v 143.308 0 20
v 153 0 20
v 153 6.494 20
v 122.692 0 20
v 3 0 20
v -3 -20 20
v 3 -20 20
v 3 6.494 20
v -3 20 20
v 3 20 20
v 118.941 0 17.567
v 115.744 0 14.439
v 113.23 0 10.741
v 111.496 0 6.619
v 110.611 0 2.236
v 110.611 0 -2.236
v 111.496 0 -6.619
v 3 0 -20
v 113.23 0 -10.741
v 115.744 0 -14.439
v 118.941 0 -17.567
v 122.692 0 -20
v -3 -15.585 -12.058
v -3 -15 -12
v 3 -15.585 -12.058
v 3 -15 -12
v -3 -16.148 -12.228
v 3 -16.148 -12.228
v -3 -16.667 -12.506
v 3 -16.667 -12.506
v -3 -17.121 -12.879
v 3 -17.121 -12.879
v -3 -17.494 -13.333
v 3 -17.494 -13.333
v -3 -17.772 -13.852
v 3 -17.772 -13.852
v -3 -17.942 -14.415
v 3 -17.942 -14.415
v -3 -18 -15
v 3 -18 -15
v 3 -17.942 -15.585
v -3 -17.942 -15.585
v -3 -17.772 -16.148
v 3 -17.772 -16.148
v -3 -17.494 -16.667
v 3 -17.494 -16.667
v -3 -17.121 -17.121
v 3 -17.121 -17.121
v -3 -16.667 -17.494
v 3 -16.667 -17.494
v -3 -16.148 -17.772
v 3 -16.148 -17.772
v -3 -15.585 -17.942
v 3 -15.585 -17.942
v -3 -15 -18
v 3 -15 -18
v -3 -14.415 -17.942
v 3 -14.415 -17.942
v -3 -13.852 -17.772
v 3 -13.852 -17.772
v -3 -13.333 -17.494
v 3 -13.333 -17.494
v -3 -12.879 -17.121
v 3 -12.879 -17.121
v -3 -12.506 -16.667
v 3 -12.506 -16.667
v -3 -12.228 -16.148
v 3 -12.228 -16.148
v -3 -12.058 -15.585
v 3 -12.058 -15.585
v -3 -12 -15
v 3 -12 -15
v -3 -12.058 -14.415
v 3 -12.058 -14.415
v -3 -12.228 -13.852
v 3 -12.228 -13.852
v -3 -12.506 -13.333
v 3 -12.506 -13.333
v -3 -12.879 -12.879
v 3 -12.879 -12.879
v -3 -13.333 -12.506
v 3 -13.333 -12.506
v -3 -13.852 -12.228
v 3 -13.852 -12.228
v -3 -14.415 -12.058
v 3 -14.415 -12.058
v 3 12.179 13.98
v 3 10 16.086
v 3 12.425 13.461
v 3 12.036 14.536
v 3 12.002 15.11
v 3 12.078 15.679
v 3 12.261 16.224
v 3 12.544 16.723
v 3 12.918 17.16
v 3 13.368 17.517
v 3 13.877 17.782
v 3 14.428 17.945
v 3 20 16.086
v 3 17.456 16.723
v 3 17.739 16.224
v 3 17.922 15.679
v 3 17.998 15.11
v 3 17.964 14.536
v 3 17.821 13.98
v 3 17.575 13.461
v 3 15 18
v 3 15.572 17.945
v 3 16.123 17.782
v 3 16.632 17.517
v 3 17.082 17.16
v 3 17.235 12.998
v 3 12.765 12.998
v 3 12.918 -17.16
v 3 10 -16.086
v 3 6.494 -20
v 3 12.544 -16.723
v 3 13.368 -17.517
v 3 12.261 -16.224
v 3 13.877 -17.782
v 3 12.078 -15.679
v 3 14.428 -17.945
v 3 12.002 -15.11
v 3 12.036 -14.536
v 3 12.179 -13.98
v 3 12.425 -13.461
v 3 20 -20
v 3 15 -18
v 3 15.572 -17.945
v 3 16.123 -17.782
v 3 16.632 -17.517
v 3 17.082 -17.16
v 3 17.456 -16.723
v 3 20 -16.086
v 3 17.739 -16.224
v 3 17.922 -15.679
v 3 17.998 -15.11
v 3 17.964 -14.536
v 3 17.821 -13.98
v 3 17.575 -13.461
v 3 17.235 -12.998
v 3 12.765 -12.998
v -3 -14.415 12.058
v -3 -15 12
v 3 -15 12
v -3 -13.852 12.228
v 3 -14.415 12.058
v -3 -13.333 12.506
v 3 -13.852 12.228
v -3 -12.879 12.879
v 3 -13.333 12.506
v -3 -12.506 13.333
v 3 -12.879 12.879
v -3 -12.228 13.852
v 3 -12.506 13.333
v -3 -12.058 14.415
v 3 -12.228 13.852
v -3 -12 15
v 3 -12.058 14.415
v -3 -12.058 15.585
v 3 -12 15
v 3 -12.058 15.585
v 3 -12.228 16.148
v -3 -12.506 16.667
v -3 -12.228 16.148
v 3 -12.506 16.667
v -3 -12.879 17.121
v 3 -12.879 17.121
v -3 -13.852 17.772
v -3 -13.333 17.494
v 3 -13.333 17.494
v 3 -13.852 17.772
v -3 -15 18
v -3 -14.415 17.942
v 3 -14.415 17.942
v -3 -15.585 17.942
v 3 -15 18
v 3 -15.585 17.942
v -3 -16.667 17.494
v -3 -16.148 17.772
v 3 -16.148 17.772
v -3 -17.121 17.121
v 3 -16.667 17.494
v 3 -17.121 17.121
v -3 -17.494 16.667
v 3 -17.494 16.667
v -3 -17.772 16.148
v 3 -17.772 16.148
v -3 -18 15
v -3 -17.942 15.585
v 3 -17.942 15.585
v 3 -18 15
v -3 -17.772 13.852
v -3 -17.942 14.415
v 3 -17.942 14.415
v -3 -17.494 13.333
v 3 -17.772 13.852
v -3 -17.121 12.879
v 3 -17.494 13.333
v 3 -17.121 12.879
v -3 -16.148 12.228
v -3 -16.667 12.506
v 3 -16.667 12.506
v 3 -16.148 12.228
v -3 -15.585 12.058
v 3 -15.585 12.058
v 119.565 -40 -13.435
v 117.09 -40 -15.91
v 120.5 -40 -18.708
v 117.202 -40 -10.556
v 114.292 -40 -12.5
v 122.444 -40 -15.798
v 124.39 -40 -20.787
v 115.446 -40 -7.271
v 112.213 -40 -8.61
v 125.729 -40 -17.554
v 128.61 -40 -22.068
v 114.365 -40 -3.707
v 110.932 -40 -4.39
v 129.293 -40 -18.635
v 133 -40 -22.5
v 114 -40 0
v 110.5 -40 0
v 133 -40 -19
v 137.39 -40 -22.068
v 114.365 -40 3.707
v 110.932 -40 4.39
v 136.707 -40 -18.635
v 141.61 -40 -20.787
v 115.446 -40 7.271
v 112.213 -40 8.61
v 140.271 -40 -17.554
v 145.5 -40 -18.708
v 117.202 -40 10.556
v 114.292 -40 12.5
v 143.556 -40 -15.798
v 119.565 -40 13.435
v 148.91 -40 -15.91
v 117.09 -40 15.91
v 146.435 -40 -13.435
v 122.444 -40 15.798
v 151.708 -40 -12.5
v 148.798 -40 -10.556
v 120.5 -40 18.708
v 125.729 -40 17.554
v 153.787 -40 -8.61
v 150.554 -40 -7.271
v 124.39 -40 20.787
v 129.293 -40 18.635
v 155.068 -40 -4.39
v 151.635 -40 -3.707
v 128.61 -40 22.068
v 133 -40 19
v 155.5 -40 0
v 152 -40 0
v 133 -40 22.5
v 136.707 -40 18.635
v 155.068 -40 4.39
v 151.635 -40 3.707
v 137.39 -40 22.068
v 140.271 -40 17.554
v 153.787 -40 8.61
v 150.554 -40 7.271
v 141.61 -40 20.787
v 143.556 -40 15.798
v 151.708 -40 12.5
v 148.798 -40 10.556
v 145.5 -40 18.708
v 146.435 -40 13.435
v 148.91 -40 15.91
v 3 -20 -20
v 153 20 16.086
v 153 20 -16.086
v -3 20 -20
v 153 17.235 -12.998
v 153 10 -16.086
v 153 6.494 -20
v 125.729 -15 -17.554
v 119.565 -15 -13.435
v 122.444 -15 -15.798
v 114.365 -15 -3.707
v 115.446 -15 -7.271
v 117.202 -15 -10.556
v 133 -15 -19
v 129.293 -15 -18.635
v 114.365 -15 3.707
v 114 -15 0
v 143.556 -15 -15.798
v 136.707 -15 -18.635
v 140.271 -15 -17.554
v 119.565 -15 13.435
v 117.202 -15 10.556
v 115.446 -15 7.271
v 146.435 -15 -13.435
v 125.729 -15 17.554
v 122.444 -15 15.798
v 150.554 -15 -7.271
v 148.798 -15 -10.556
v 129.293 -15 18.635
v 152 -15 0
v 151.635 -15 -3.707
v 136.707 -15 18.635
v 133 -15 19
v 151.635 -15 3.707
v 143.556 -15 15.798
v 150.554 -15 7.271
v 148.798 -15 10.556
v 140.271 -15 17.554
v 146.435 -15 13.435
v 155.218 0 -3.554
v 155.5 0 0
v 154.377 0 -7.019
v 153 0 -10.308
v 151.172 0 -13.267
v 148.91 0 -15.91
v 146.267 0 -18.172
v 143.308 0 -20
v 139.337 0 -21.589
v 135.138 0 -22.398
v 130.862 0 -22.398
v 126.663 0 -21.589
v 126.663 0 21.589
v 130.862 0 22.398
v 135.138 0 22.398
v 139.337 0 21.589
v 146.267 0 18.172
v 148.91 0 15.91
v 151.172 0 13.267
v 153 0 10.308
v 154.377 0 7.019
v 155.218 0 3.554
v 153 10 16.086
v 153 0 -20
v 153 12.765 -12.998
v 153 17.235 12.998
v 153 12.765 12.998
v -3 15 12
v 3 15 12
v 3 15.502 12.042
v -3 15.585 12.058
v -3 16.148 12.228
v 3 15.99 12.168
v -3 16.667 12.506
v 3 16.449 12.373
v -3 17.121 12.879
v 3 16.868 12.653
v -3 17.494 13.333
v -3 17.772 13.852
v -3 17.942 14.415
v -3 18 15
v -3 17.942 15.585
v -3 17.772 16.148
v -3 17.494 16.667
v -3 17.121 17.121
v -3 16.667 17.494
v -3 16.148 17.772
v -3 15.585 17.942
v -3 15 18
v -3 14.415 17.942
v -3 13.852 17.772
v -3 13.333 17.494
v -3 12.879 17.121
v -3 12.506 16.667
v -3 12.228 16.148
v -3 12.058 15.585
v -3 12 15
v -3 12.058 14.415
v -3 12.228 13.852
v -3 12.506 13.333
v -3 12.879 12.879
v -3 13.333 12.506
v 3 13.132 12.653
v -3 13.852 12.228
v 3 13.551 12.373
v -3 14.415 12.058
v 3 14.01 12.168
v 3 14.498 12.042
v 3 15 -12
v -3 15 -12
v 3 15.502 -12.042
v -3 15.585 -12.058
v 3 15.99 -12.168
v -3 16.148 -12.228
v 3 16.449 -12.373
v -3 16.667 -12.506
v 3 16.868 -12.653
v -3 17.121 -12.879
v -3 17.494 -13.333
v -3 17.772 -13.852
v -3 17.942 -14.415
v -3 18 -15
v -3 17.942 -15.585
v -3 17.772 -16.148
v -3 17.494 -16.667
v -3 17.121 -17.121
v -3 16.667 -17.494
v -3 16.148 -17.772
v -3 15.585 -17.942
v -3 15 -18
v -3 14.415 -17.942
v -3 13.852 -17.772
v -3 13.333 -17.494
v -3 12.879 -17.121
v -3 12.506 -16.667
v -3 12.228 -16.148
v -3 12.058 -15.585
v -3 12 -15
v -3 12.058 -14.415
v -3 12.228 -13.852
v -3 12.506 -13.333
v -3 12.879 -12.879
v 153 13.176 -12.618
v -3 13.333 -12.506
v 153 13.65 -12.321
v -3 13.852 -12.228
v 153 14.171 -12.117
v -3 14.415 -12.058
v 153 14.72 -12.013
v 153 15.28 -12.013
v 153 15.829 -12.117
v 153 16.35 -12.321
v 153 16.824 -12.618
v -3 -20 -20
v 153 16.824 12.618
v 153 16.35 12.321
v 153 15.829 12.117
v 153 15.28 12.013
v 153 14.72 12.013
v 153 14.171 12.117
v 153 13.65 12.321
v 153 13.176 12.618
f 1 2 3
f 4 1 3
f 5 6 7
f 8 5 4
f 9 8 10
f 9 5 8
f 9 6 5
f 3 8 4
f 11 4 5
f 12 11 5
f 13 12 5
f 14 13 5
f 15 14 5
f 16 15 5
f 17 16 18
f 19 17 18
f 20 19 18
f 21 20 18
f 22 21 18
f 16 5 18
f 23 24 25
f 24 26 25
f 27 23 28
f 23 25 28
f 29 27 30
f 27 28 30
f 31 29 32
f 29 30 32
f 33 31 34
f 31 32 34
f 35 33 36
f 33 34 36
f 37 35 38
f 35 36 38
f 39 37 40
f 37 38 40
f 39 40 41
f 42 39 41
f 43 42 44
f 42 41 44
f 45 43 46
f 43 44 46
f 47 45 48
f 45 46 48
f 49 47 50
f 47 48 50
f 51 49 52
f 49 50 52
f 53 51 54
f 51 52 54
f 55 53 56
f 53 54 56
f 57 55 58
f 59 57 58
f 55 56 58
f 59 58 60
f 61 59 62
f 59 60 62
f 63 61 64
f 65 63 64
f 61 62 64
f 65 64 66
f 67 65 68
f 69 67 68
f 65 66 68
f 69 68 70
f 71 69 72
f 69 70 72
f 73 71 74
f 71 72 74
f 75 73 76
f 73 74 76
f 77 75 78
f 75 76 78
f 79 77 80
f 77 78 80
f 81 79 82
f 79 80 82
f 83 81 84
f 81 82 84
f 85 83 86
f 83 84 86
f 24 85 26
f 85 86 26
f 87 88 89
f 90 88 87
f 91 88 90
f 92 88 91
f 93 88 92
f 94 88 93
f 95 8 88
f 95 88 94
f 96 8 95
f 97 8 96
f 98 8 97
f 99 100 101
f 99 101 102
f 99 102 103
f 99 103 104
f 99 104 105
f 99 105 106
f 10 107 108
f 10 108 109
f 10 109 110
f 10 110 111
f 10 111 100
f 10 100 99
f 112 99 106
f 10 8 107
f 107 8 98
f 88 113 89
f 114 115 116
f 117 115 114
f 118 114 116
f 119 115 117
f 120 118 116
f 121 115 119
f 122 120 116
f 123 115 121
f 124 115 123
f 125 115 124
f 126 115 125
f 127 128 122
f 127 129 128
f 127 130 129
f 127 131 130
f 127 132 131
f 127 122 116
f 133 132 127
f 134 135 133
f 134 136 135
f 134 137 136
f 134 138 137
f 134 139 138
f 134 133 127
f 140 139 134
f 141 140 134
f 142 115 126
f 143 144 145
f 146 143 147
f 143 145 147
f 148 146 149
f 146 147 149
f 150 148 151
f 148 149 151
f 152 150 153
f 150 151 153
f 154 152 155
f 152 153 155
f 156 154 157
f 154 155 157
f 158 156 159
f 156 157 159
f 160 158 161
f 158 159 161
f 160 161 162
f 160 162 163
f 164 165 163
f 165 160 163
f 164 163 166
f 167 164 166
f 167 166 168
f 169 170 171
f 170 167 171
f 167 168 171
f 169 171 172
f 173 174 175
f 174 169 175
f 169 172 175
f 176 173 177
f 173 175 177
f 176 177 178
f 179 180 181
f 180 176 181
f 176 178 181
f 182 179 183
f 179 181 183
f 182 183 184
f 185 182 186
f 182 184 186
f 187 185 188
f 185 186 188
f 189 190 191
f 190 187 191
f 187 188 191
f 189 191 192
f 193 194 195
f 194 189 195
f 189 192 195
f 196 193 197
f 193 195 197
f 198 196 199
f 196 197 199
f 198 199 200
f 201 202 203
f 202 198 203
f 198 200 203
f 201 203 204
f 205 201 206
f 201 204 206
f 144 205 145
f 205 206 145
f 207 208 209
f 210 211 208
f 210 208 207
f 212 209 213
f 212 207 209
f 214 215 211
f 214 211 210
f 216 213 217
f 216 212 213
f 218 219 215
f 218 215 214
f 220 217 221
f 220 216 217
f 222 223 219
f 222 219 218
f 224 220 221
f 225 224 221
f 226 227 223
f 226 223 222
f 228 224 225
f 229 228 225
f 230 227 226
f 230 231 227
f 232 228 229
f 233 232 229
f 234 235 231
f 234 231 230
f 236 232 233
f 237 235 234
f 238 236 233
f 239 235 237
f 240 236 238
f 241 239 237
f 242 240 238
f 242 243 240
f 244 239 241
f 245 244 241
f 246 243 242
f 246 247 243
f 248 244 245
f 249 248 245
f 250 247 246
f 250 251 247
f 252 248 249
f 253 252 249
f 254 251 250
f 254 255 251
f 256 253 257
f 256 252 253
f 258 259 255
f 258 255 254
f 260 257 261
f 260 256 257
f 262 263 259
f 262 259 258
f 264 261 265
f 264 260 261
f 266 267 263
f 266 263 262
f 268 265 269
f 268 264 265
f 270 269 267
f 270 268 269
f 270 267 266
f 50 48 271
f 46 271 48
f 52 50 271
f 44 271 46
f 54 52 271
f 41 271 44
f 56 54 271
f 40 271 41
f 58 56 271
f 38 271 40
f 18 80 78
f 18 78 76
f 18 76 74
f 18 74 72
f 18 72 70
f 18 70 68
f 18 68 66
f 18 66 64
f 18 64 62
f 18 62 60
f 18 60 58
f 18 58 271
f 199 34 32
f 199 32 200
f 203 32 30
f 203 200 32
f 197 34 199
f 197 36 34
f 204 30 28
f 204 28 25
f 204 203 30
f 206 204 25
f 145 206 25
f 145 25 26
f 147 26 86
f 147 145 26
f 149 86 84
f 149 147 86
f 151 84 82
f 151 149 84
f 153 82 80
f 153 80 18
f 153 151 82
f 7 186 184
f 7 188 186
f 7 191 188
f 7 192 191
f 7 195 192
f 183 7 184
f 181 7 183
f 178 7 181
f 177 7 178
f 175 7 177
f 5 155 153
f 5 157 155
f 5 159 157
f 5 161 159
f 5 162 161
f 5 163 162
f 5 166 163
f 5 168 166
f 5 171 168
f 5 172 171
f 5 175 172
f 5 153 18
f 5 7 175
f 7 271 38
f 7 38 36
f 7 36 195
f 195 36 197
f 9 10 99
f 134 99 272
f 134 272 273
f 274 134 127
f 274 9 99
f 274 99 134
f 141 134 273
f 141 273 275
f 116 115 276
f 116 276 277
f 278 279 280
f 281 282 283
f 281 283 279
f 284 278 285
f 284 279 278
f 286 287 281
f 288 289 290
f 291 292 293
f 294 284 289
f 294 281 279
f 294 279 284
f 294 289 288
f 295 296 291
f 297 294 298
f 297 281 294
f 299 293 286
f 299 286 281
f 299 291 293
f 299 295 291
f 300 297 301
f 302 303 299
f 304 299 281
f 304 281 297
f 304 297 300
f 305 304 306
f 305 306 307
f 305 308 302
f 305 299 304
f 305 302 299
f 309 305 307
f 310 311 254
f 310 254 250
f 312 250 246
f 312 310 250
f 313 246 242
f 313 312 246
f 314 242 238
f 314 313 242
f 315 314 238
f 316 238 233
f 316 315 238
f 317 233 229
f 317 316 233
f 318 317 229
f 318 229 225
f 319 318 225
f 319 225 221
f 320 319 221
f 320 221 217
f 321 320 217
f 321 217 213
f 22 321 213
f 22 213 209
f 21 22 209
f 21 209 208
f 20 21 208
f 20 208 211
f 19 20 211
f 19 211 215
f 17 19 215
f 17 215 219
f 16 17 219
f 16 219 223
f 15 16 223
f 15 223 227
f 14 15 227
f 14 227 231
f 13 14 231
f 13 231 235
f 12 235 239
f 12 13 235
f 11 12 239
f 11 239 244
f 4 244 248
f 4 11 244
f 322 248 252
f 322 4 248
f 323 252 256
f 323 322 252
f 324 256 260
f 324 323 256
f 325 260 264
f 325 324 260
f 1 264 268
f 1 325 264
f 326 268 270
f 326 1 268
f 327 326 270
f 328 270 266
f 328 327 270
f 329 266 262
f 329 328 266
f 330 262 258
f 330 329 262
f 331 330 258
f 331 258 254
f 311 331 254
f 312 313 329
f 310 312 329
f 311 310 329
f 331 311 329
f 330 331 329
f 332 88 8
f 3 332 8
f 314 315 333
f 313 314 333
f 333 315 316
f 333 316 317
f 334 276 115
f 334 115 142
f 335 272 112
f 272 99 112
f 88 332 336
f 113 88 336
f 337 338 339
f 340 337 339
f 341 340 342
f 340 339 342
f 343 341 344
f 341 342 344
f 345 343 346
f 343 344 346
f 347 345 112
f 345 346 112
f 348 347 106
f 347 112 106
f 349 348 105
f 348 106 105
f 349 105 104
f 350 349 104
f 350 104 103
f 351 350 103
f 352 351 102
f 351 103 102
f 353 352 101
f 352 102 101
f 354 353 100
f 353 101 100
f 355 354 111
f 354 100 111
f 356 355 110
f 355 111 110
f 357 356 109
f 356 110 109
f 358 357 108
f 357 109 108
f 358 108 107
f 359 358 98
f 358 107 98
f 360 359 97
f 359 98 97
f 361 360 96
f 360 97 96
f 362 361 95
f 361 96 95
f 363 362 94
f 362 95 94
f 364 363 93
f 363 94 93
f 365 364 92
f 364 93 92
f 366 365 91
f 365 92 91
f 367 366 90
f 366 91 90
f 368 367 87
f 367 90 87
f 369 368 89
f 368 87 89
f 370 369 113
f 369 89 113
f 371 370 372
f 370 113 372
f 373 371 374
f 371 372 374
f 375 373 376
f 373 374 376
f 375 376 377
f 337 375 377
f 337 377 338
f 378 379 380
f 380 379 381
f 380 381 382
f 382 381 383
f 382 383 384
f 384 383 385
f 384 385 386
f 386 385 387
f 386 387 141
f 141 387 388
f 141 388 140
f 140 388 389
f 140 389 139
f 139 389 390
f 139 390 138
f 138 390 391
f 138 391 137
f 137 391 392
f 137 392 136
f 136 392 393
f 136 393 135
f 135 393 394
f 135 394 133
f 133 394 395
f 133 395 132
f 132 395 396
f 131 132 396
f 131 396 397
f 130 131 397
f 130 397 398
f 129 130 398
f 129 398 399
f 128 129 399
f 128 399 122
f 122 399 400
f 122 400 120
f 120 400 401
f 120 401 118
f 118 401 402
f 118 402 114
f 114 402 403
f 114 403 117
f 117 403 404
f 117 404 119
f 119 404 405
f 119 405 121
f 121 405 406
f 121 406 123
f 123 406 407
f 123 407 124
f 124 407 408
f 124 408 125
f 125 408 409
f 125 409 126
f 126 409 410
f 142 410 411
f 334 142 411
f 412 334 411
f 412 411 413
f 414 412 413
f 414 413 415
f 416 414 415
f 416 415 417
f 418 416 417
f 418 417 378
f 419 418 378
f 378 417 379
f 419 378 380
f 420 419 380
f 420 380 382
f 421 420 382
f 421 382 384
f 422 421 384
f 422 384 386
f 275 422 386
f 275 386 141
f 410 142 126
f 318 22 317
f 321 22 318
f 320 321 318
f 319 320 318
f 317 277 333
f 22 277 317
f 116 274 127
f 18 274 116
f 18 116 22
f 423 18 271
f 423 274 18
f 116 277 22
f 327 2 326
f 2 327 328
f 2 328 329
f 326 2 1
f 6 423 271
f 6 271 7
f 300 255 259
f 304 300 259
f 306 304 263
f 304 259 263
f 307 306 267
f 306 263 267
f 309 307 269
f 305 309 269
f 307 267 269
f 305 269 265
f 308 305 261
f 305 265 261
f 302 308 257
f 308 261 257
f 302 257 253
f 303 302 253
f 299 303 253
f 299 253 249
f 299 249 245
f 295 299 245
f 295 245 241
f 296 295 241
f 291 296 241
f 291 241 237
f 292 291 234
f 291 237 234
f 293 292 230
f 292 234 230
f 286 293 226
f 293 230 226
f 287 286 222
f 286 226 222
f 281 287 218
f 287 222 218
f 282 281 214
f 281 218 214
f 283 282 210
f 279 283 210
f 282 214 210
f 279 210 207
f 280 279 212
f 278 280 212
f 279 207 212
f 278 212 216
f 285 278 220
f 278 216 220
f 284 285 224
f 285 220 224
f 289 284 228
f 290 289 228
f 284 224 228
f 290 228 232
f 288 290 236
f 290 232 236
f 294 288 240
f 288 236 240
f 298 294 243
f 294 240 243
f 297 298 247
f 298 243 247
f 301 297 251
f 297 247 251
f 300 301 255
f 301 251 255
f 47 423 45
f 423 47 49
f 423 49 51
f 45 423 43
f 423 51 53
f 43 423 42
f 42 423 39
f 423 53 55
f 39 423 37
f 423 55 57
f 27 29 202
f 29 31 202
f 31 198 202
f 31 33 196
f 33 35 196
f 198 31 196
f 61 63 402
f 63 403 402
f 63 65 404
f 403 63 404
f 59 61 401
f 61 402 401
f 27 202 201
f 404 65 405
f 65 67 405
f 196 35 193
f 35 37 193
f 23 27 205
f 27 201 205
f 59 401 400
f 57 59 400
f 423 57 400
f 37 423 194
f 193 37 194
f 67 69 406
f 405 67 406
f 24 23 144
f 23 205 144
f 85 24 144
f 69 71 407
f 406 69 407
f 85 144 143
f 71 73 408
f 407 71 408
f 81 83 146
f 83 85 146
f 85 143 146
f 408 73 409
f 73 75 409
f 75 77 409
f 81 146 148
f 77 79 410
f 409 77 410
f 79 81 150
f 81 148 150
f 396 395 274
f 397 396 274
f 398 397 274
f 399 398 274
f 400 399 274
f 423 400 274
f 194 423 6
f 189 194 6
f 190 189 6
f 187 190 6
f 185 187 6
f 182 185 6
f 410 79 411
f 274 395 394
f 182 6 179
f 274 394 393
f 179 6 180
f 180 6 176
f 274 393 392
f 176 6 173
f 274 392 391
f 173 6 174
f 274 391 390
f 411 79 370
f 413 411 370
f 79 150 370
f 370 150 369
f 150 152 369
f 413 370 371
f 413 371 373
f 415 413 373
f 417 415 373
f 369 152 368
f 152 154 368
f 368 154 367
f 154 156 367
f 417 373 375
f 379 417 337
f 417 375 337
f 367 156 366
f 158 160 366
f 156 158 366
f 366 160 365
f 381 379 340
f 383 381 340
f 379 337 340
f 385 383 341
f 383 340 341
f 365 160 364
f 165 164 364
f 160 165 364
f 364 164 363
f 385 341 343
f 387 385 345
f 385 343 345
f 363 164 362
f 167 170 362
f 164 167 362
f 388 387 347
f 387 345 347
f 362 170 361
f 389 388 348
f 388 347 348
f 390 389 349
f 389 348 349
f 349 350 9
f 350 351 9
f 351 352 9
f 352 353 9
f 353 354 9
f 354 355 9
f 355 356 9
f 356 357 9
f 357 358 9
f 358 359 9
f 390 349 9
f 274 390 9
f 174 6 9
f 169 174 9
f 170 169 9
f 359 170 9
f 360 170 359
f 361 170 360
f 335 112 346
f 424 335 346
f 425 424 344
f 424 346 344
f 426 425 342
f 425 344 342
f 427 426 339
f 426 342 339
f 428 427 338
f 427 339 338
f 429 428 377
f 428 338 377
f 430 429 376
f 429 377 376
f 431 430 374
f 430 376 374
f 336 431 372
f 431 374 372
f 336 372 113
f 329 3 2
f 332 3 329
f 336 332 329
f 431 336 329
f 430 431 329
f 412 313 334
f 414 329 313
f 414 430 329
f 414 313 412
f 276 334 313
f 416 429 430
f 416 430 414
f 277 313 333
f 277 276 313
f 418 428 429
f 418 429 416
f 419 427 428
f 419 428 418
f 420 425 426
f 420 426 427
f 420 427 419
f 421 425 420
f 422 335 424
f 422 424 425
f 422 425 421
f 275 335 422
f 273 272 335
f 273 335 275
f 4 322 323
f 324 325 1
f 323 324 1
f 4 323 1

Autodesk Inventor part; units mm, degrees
ref_plane "YZ Plane" through (0, 0, 0) normal (1, 0, 0) x (0, 1, 0)
ref_plane "XZ Plane" through (0, 0, 0) normal (0, 1, 0) x (-1, 0, 0)
sketch "Sketch1" plane through (0, 0, 0) normal (1, 0, 0) x (0, 1, 0)
  line L0 (-20, 20) -> (20, 20)
  line L1 (20, 20) -> (20, -20)
  line L2 (20, -20) -> (-20, -20)
  line L3 (-20, -20) -> (-20, 20)
  line L4 (-20, 20) -> (20, -20) construction
  line L5 (20, 20) -> (-20, -20) construction
  point P0 (0, 0)
  dimension "d0" = 40
  dimension "d1" = 40
extrude "Extrusion1" add sketch "Sketch1" along normal mid plane 6
sketch "Sketch2" plane through (3, 0, 0) normal (1, 0, 0) x (0, 0, -1)
  line L0 (20, 20) -> (-20, 20) projected
  line L1 (-20, 20) -> (-15, 20)
  line L2 (-15, 20) -> (-15, 15)
  line L3 (-15, 15) -> (-20, 15)
  line L4 (-20, 20) -> (-20, -20) projected
  circle A0 centre (-15, 15) radius 3
  point P0 (0, 0)
  dimension "d4" = 5
  dimension "d5" = 5
  dimension "d6" = 6
extrude "Extrusion2" cut sketch "Sketch2" against normal blind 6 contours A0 L3 L2 | L2 L3 A0
mirror "Mirror1" about plane through (0, 0, 0) normal (0, 0, 1) of "Extrusion2"
mirror "Mirror2" about plane through (0, 0, 0) normal (0, 1, 0) of "Extrusion2", "Mirror1"
ref_plane "Work Plane4" through (0, 0, 20) normal (0, 0, -1) x (1, 0, 0)
ref_plane "Work Plane3" through (0, 0, 0) normal (0, 0, -1) x (1, 0, 0)
sketch "Sketch3" plane through (0, 0, 20) normal (0, 0, -1) x (1, 0, 0)
  line L0 (3, -20) -> (3, 20) projected
  line L1 (3, 0) -> (3, -15)
  line L2 (3, -15) -> (153, -15) construction
  line L3 (3, 0) -> (3, -7.5)
  point P0 (0, 0)
  dimension "d10" = 15
  dimension "d11" = 150
  dimension "d12" = 7.5
sketch "Sketch4" plane through (3, 0, 0) normal (1, 0, 0) x (0, 0, -1)
  circle A0 centre (-15, 15) radius 3 projected
  circle A1 centre (15, 15) radius 3 projected
  circle A2 centre (-15, 15) radius 3 projected
  circle A3 centre (-15, 15) radius 3
  circle A4 centre (15, 15) radius 3
  line L0 (-20, 20) -> (20, 20) projected
  line L1 (-16.0857, 20) -> (-12.9984, 17.2346)
  line L2 (-17.7822, 15) -> (18, 15)
  circle A5 centre (15, 15) radius 3 projected
  line L3 (-16.0857, 10) -> (-12.9984, 12.7654)
  line L4 (0, 20) -> (0, 0)
  line L5 (-16.0857, 10) -> (-20, 6.4938)
  line L6 (-20, -20) -> (-20, 20) projected
  line L7 (-20, 6.4938) -> (-20, 0)
  circle A6 centre (15, 15) radius 3
  line L8 (16.0857, 20) -> (12.9984, 17.2346)
  line L9 (16.0857, 10) -> (12.9984, 12.7654)
  line L10 (16.0857, 10) -> (20, 6.4938)
  line L11 (20, 6.4938) -> (20, 0)
  line L12 (-16.0857, 20) -> (16.0857, 20)
  line L13 (-20, 0) -> (20, 0)
extrude "Extrusion3" add sketch "Sketch4" along normal blind 150 contours L2 L4 L13 L6 L5 L3 A0 | A0 L1 L0 L4 L2 | L4 L0 L8 A1 L2 | L2 A1 L9 L10 L11 L13 L4
sketch "Sketch5" plane through (3, 0, -20) normal (0, -1, 0) x (1, 0, 0)
  line L0 (150, 0) -> (150, 40)
  line L1 (150, 40) -> (150, 50)
  line L2 (150, 50) -> (150, -10)
  line L3 (150, 3.9143) -> (150, 36.0857) projected
  line L4 (150, 20) -> (110, 20)
  circle A0 centre (130, 20) radius 22.5
  point P0 (-3, 20)
  dimension "d15" = 10
  dimension "d16" = 60
  dimension "d17" = 40
  dimension "d18" = 45
extrude "Extrusion4" add sketch "Sketch5" along normal blind 40
sketch "Sketch6" plane through (133, -40, 0) normal (0, -1, 0) x (1, 0, 0)
  circle A0 centre (0, 0) radius 19
  point P0 (-133, 0)
  dimension "d21" = 38
extrude "Extrusion5" cut sketch "Sketch6" against normal blind 25
ref_plane "Work Plane1" through (0, 0, 0) normal (0, 0, 1) x (1, 0, 0)
ref_plane "Work Plane2" through (0, 0, 0) normal (0, 0, -1) x (1, 0, 0)
properties part number "TopBracket"
